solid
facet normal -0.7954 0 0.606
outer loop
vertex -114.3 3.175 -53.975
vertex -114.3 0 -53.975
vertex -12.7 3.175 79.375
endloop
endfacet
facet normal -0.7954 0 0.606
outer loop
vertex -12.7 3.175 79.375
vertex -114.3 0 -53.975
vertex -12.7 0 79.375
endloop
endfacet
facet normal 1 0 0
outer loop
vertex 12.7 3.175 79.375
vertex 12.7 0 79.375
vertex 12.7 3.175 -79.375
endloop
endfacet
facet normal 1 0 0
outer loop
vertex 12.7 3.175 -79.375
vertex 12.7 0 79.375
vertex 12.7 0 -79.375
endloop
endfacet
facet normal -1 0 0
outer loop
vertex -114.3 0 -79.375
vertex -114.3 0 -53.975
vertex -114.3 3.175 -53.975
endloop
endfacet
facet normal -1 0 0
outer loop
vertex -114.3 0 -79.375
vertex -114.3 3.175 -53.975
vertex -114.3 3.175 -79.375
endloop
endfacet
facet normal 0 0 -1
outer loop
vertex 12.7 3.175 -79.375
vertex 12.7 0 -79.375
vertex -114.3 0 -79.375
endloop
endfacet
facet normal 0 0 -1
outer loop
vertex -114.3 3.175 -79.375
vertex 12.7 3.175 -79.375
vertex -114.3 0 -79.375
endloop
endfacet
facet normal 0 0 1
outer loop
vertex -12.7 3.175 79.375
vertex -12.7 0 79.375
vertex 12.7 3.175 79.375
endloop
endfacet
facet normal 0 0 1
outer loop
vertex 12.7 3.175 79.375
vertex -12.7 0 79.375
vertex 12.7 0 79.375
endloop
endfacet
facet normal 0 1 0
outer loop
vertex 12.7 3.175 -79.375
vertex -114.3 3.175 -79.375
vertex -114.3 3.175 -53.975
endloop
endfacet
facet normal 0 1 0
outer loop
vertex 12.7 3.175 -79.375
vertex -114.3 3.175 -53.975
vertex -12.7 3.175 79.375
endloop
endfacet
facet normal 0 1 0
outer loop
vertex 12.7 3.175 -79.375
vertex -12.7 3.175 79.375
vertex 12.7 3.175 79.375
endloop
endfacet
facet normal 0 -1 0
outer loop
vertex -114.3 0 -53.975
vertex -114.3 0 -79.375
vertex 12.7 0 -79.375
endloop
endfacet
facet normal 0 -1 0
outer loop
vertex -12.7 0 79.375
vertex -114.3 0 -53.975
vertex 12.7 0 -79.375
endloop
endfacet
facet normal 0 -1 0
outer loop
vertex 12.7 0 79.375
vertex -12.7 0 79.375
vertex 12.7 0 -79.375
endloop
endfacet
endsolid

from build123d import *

# Parameters (mm, degrees)
SKETCH1_W           = 101.6
SKETCH1_H           = 25.4
SKETCH1_W_2         = 25.4
SKETCH1_H_2         = 158.75
BOSS_EXTRUDE1_DEPTH = 3.175


with BuildPart() as part:
    # Sketch1 → Boss-Extrude1 (new body)
    with BuildSketch(Plane(origin=(0, 0, 0), x_dir=(1, 0, 0), z_dir=(0, 1, 0))):
        with Locations((-63.5, 66.675)):
            Rectangle(SKETCH1_W, SKETCH1_H)
        Polygon((-12.7, -79.375), (-12.7, 53.975), (-114.3, 53.975), align=None)
        Rectangle(SKETCH1_W_2, SKETCH1_H_2)
    extrude(amount=BOSS_EXTRUDE1_DEPTH)


solid = part.part
